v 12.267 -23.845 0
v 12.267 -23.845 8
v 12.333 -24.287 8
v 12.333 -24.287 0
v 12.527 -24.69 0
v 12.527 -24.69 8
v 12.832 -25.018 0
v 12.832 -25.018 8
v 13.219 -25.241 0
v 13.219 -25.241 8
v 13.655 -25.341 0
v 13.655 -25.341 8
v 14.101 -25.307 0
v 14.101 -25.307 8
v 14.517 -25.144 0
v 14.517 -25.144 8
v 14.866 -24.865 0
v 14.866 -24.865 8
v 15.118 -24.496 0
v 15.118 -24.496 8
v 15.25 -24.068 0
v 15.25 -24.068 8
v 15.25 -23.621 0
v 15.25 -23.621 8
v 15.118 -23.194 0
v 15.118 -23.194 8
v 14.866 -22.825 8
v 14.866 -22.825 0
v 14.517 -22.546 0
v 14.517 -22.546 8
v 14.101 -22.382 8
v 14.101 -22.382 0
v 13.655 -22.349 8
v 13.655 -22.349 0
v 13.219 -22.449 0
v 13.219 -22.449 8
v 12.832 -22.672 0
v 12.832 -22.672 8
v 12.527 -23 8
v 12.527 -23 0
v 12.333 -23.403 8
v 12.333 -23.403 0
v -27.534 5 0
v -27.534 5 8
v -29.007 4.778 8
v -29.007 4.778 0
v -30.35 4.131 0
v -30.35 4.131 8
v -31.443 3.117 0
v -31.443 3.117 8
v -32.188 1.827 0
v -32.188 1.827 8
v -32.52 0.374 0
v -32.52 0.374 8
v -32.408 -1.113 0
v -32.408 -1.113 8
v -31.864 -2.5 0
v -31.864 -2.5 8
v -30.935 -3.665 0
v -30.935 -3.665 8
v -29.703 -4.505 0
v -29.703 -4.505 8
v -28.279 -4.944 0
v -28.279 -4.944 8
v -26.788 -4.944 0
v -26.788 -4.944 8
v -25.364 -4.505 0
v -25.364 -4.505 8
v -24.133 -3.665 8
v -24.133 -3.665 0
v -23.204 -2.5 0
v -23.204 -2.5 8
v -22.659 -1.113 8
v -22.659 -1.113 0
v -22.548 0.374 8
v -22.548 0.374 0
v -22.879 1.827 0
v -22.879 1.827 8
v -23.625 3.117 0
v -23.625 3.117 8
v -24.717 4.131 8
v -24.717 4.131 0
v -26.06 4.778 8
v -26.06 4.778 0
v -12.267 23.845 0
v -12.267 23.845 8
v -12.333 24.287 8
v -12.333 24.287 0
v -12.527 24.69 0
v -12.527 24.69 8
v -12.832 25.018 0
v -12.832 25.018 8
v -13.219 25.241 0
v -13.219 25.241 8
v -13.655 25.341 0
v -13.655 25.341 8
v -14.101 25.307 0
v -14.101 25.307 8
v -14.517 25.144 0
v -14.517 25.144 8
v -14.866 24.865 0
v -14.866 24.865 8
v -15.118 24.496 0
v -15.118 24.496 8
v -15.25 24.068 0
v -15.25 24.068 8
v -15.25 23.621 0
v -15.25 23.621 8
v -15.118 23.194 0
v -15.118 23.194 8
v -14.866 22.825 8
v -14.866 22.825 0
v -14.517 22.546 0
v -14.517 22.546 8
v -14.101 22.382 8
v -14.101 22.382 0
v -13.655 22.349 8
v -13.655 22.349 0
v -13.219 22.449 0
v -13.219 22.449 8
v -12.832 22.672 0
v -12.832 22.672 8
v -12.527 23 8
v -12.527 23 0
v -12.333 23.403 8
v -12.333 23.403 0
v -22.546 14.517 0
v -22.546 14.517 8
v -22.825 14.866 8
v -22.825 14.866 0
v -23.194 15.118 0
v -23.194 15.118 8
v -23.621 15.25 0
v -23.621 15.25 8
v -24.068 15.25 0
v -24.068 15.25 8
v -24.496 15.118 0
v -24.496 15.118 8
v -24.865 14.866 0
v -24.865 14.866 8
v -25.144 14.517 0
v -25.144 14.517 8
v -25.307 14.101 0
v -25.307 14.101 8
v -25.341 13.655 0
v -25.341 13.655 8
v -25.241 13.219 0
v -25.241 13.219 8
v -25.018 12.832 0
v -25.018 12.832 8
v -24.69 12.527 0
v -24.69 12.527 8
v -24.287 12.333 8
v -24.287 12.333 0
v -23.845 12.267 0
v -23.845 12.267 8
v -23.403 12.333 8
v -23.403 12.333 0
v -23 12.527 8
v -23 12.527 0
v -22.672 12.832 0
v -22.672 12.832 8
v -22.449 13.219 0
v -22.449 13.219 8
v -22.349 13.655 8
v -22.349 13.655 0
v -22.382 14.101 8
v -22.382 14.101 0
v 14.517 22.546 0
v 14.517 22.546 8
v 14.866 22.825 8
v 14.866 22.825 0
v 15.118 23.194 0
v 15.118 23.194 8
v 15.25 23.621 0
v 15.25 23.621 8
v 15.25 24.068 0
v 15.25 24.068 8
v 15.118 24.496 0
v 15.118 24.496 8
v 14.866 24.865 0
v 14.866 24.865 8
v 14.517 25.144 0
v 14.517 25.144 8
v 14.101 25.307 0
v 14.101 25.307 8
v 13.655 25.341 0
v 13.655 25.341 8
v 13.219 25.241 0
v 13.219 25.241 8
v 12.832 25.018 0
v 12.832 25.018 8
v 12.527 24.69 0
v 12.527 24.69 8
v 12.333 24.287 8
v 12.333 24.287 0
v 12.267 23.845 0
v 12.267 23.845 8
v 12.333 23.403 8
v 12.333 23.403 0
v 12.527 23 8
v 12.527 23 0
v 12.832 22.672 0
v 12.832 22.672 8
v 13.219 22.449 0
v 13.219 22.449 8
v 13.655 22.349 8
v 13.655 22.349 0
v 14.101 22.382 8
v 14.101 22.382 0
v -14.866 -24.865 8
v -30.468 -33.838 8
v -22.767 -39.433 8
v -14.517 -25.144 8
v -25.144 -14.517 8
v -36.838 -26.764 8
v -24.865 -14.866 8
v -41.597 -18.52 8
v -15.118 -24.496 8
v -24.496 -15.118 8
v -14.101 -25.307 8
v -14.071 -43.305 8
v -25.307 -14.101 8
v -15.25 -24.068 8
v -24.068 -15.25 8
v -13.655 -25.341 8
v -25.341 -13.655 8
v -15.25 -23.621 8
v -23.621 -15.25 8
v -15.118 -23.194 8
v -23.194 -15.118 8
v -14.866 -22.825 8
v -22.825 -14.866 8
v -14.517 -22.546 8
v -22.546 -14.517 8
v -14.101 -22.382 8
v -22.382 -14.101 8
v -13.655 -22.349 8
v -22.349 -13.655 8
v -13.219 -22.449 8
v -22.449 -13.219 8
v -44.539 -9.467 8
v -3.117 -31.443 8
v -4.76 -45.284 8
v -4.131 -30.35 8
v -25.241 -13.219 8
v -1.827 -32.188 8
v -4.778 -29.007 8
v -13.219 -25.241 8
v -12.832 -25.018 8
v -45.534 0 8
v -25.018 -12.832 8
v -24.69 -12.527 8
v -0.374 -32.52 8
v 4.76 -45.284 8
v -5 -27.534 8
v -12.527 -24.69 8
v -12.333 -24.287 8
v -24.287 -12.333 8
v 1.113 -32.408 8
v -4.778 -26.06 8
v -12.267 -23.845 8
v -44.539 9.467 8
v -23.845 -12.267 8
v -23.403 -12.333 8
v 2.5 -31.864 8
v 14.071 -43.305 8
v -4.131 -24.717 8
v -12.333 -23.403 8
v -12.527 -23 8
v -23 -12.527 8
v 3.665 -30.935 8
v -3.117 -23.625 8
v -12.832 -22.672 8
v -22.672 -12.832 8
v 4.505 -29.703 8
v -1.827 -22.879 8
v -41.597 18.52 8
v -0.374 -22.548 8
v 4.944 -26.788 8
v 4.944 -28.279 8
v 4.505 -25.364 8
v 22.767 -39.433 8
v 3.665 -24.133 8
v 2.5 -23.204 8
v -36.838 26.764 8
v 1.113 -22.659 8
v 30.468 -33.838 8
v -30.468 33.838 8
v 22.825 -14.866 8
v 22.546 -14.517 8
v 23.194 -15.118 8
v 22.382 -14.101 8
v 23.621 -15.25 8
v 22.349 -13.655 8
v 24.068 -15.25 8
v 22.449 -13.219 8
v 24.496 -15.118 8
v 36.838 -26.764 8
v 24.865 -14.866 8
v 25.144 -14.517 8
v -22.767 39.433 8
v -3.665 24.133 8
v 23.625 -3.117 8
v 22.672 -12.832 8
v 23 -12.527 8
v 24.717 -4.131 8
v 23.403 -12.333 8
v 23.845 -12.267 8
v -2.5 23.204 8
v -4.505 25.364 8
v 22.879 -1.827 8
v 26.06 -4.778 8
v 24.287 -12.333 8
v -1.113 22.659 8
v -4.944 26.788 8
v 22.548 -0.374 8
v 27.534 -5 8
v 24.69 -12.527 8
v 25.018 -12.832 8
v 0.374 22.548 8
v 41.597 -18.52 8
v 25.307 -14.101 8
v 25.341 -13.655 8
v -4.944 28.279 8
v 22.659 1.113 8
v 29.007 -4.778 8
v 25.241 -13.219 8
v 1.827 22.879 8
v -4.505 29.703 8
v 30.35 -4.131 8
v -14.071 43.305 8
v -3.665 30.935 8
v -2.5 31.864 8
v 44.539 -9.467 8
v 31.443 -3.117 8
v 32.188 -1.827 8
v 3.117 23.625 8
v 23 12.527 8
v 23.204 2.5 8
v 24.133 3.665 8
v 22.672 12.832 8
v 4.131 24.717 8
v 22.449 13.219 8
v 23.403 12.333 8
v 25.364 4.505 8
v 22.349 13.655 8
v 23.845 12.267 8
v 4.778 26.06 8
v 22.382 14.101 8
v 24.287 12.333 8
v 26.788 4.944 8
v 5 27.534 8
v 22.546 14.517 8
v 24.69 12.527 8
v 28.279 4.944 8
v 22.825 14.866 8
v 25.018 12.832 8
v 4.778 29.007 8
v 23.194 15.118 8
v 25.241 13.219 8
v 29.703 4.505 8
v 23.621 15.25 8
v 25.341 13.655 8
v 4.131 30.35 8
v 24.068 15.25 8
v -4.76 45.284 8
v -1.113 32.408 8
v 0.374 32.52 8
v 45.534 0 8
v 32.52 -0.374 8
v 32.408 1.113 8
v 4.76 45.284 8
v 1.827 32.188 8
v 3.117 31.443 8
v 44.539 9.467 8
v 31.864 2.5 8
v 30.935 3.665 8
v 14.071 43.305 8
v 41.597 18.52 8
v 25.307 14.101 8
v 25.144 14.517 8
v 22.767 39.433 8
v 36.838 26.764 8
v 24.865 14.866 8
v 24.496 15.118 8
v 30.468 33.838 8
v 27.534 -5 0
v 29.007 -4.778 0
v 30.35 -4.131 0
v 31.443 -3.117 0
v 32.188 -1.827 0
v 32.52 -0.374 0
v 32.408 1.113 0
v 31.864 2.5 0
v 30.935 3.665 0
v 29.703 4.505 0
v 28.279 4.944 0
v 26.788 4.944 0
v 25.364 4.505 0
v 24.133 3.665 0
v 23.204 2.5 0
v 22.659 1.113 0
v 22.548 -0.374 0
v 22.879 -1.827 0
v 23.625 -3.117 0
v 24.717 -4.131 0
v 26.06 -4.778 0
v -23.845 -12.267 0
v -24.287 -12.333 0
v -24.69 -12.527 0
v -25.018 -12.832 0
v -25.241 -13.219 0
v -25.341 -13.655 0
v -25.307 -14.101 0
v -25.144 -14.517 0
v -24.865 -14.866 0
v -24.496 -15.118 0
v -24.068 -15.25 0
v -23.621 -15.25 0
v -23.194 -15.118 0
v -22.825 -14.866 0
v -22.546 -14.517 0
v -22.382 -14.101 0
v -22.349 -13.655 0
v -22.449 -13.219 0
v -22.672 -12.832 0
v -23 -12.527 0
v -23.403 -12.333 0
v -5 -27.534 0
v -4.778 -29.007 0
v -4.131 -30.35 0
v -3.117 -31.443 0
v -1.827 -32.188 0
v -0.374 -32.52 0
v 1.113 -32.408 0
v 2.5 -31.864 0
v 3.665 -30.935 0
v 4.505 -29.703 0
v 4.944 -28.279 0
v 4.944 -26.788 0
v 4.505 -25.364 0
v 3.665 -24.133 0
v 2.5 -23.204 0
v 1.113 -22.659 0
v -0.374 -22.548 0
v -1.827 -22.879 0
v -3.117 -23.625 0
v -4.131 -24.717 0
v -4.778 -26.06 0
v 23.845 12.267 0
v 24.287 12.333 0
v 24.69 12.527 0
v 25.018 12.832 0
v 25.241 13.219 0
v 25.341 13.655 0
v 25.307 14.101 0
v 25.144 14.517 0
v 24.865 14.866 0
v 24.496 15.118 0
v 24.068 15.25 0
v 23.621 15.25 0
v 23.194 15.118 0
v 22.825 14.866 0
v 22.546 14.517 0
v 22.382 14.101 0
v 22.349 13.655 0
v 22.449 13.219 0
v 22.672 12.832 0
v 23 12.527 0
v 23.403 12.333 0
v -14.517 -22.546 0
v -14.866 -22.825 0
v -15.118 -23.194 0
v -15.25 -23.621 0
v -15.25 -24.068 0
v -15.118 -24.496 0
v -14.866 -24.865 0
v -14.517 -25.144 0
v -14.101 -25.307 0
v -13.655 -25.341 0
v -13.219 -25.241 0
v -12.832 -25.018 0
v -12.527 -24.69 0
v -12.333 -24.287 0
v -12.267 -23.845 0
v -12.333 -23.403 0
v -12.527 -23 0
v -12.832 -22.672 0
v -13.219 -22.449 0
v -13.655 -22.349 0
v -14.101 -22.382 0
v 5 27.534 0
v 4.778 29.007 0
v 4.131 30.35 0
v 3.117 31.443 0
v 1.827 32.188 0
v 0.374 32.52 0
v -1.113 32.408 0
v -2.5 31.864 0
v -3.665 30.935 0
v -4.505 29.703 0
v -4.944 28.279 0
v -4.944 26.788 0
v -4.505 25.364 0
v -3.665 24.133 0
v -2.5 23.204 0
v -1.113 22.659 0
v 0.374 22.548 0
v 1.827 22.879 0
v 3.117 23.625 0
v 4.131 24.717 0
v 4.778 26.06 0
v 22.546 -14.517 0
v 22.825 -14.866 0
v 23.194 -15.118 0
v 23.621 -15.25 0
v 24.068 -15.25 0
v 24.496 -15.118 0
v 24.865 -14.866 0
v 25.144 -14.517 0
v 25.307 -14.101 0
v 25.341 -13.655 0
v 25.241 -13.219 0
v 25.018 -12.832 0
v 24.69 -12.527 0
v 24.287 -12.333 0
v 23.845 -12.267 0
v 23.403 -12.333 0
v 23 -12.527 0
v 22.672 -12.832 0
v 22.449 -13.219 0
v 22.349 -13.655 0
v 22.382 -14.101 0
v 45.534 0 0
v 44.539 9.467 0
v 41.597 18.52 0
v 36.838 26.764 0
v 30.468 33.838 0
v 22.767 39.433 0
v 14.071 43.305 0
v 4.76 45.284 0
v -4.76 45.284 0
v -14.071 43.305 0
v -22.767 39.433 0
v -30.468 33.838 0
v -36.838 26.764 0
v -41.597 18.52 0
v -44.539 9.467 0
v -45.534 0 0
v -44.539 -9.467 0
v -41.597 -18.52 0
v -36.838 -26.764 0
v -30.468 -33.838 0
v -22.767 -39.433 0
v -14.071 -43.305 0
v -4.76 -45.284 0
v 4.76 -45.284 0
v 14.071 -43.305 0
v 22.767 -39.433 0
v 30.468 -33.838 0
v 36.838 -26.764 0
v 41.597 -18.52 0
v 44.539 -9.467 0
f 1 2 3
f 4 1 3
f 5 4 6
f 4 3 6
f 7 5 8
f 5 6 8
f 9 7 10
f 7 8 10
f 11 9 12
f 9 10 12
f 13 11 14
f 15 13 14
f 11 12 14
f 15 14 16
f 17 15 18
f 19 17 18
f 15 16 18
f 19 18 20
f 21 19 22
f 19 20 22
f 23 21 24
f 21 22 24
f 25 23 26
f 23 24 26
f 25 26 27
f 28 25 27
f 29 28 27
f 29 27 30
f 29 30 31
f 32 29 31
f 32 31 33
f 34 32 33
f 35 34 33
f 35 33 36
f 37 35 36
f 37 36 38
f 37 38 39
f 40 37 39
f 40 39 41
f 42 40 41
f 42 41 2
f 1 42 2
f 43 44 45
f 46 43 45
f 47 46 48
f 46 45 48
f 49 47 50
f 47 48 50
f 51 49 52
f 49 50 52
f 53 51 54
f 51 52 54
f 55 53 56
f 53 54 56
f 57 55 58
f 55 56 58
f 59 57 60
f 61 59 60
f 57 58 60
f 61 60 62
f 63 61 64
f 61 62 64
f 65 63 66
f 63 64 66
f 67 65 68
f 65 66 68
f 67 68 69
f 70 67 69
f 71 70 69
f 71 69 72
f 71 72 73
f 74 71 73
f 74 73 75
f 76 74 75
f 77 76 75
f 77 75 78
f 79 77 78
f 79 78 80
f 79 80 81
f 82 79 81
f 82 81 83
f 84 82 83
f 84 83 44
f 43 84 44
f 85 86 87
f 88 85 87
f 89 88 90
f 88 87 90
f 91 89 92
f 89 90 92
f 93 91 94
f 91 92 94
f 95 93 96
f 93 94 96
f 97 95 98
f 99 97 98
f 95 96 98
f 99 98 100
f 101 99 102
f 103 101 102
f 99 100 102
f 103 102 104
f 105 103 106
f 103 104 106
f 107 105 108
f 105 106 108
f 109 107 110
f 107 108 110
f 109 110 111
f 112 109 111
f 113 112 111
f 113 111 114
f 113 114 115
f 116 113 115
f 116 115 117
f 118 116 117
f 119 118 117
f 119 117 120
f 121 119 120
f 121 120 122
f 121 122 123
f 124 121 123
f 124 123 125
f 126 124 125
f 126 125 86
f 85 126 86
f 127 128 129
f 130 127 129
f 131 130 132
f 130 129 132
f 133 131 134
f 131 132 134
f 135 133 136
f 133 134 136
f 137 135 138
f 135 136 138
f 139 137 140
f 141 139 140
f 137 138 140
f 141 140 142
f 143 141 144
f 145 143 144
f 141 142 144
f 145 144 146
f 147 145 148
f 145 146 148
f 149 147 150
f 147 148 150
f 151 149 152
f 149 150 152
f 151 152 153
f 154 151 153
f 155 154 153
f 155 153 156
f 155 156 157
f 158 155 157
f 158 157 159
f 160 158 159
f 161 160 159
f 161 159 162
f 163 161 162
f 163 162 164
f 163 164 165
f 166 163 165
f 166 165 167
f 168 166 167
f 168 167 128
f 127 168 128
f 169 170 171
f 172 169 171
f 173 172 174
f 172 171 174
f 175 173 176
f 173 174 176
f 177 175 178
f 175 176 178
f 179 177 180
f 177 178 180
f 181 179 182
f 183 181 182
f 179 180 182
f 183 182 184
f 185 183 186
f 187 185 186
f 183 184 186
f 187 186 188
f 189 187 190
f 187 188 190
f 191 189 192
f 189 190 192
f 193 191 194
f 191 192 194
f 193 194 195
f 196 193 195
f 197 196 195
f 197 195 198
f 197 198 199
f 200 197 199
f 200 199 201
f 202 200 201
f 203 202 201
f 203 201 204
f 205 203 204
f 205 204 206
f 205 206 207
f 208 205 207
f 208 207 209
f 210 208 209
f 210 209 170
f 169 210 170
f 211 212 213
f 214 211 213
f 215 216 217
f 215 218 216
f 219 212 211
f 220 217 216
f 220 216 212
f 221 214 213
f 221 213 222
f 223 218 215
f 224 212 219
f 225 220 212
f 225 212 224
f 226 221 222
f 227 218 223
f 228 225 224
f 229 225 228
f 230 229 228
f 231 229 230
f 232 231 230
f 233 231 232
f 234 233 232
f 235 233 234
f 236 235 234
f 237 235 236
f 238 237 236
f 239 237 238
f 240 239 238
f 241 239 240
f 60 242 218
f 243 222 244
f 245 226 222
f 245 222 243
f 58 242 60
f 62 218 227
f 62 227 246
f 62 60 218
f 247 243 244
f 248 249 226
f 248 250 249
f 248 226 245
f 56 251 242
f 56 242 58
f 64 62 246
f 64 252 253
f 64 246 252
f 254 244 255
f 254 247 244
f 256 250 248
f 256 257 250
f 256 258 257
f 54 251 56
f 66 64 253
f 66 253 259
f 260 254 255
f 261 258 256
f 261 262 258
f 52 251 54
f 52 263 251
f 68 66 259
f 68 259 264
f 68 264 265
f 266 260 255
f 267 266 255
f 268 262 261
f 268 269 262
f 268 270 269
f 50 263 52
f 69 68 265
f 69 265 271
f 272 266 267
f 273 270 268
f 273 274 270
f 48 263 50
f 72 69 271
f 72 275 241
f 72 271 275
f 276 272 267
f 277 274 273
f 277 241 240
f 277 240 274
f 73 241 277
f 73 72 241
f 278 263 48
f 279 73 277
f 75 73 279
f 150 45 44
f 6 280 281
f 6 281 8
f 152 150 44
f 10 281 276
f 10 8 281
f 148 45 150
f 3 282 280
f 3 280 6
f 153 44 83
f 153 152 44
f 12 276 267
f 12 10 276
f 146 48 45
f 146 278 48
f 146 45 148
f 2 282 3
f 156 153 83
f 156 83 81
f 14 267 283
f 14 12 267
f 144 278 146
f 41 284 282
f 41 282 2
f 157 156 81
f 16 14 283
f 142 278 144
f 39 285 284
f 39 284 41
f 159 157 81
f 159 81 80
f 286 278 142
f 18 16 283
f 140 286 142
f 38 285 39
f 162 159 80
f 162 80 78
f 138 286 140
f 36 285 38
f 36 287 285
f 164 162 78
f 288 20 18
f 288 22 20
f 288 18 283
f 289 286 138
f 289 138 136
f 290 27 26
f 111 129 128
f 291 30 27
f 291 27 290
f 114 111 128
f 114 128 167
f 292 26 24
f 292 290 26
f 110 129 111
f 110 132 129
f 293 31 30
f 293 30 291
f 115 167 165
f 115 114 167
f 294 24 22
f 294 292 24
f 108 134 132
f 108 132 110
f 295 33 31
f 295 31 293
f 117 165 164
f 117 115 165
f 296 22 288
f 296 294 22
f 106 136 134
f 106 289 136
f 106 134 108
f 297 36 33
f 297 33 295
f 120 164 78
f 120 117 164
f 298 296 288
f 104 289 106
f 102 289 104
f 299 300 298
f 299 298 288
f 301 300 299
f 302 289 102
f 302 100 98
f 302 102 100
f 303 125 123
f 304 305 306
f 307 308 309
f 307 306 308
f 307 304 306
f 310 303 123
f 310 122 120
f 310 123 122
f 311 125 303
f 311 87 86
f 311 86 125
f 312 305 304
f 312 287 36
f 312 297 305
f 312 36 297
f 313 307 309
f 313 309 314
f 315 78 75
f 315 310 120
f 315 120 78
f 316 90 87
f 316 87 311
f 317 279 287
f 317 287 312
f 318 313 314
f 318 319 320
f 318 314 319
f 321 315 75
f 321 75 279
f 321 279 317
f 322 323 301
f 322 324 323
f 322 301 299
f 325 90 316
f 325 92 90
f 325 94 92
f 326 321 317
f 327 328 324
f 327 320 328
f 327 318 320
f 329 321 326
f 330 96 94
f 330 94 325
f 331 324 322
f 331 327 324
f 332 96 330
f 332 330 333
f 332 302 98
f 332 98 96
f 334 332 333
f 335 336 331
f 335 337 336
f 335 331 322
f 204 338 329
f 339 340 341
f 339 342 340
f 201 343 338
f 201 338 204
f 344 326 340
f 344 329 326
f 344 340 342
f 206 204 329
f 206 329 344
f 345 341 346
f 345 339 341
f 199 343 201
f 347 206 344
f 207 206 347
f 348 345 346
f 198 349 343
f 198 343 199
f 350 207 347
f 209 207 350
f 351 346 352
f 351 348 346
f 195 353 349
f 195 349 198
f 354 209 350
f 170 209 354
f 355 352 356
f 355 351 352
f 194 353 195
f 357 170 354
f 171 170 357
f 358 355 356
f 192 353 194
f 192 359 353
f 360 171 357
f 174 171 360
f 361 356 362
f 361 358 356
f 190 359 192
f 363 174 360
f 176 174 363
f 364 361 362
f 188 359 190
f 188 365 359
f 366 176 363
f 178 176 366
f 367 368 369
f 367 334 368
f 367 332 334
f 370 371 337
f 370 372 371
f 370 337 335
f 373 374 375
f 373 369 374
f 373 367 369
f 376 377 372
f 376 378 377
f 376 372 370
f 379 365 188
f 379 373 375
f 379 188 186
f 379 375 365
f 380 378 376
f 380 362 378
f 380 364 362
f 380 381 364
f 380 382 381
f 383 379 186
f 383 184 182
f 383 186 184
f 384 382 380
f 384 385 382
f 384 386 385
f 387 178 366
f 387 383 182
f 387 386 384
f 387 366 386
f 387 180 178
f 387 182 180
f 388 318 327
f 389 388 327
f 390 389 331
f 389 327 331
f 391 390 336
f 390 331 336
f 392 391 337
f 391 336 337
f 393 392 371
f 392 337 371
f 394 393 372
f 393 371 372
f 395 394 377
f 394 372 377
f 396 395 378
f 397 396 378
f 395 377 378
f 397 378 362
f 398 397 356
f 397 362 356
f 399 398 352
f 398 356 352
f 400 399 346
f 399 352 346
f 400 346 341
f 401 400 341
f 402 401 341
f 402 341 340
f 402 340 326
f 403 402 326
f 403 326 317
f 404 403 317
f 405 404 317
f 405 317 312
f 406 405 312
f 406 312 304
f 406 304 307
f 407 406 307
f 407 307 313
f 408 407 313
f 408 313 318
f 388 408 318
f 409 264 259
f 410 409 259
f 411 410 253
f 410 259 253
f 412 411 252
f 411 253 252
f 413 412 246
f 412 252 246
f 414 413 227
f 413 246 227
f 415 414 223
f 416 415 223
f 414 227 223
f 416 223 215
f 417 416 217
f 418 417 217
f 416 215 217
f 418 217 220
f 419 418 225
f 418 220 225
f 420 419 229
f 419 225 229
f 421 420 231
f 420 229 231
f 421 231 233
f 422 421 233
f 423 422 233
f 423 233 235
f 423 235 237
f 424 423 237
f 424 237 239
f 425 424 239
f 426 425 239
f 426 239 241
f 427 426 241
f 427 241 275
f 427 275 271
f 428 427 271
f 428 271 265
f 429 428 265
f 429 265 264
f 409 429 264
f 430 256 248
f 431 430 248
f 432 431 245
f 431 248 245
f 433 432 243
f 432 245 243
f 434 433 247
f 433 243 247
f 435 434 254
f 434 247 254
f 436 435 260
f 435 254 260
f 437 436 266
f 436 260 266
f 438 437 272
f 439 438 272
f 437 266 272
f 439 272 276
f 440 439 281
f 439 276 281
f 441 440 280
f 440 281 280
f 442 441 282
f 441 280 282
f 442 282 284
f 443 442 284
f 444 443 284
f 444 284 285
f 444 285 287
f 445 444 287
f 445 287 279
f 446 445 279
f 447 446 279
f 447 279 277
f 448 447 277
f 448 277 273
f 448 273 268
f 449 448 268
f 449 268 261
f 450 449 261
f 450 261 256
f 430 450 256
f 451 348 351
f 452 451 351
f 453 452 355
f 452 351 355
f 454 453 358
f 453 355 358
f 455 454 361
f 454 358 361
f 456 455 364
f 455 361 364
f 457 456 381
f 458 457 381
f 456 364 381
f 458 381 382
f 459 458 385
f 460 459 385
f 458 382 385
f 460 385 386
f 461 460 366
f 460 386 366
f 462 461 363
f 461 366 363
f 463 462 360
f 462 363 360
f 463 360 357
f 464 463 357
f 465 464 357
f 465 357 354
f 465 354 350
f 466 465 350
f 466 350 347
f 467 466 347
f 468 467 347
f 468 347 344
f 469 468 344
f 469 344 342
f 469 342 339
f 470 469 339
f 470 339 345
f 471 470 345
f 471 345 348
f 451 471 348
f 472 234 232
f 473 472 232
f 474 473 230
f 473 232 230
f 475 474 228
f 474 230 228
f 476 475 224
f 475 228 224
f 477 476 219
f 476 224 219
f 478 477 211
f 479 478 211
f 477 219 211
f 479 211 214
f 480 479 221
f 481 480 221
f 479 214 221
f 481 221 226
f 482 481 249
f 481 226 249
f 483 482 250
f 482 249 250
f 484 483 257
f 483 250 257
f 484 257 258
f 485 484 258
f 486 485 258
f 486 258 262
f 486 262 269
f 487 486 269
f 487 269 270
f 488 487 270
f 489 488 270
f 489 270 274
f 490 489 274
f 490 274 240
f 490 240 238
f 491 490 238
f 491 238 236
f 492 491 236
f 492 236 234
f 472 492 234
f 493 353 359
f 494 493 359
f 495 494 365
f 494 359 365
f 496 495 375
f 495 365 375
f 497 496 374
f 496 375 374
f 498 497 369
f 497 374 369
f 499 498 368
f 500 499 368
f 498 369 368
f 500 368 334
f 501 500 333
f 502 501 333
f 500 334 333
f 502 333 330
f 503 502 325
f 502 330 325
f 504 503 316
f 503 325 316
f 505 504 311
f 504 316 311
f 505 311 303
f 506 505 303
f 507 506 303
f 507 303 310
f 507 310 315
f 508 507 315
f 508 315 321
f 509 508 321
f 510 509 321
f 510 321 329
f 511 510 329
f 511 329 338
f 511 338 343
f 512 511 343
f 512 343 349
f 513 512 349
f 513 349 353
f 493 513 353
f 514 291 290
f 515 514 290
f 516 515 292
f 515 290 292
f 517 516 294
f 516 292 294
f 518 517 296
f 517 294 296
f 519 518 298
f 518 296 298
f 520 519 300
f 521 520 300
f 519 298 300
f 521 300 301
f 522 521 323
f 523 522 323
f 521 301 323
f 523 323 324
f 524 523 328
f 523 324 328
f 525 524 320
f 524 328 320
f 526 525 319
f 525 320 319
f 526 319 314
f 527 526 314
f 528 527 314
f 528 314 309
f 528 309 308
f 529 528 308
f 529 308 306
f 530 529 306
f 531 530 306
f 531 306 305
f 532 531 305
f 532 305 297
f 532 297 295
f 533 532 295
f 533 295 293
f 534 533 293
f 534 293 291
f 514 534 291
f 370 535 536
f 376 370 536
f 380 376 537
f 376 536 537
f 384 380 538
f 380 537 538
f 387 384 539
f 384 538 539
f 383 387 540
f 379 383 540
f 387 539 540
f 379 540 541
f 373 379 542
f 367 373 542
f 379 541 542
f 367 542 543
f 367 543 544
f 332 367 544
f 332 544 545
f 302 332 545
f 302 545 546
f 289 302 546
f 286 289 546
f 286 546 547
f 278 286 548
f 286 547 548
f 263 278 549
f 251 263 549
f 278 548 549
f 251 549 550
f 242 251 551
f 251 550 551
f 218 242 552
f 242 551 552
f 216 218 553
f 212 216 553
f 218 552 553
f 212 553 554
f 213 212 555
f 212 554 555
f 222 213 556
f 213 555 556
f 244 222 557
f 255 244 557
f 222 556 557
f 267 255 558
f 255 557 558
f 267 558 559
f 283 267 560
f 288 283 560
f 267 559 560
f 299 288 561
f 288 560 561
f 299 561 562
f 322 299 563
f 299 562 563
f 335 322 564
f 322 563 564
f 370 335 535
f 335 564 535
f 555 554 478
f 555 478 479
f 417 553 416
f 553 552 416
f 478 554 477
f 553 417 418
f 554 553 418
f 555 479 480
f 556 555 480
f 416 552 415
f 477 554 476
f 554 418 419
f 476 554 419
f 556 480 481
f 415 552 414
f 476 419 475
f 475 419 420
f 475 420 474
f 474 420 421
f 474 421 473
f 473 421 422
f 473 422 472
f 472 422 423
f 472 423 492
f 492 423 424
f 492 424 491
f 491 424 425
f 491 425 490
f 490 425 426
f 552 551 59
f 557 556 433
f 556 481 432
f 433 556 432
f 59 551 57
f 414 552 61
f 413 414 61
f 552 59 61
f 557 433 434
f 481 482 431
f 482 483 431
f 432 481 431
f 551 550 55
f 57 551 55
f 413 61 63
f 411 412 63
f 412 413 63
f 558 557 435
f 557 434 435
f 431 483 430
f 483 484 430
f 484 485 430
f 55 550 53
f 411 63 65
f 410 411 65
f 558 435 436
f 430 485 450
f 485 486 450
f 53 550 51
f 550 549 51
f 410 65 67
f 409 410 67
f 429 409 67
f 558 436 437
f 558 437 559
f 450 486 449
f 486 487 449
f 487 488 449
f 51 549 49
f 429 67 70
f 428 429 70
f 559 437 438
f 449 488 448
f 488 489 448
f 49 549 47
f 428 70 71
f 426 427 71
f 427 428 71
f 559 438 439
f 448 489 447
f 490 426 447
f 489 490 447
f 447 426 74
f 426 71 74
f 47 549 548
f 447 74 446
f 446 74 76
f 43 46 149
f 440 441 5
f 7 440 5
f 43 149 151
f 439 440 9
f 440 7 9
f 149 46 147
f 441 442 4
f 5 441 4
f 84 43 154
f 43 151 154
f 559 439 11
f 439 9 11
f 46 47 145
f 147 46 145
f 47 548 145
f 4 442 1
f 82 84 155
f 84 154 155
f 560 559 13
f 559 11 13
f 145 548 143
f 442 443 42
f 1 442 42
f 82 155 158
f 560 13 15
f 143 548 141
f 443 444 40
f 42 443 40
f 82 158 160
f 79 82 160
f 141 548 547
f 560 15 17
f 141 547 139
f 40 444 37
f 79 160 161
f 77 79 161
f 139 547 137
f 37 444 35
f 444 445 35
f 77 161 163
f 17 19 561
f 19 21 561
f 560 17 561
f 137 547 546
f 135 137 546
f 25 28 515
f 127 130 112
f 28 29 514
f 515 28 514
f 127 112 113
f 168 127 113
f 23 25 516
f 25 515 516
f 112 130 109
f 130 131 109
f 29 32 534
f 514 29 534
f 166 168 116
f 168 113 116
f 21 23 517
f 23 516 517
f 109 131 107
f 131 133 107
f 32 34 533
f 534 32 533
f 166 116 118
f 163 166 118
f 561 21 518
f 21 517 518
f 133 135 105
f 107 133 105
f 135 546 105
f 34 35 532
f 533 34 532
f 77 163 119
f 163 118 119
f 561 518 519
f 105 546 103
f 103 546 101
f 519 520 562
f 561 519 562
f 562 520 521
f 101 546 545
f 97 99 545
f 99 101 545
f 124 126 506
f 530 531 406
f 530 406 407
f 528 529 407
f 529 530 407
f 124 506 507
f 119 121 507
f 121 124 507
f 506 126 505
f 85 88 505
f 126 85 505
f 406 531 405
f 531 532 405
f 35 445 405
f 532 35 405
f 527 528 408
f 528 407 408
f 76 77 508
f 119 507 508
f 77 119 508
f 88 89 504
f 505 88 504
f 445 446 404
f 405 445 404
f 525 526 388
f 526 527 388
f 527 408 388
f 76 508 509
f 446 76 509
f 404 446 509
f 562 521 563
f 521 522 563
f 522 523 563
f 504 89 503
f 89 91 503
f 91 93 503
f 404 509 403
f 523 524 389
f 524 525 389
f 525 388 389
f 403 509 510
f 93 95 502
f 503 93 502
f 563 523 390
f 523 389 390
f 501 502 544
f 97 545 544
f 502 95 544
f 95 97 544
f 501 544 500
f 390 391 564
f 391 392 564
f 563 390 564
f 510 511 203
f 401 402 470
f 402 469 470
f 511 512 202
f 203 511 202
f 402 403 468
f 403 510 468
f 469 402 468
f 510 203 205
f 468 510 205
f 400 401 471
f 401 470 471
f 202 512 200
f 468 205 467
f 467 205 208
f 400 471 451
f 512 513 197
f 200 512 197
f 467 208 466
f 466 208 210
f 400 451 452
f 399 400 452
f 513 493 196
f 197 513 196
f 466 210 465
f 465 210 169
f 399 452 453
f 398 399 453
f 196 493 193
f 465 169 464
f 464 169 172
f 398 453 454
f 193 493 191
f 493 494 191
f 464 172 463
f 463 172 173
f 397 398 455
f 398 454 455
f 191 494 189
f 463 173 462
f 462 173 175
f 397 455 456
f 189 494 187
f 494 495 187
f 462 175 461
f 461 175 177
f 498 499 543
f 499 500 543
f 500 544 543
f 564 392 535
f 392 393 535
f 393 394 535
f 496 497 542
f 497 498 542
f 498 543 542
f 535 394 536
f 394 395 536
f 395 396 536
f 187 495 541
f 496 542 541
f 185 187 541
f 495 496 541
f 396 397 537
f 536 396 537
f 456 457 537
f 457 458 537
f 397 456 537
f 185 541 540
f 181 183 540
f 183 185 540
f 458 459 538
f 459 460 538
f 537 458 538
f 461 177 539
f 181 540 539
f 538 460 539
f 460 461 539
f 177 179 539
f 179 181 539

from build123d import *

# Parameters (mm, degrees)
SKETCH_R              = 45.533695
PAD_DEPTH             = 8
SKETCH001_R           = 5
POCKET_DEPTH          = 266.074935
POLARPATTERN_COUNT    = 4
SKETCH002_R           = 1.5
POCKET001_DEPTH       = 266.074935
POLARPATTERN001_COUNT = 12


with BuildPart() as part:
    # Sketch → Pad (new body)
    with BuildSketch(Plane.XY):
        Circle(SKETCH_R)
    extrude(amount=PAD_DEPTH)

    # Sketch001 (on Face3 of Pad) → Pocket (cut, through all)
    with BuildSketch(Plane.XY.offset(8)):
        with Locations((0, 27.533695)):
            Circle(SKETCH001_R)
    pocket = extrude(amount=-POCKET_DEPTH, mode=Mode.SUBTRACT)

    # PolarPattern: Pocket ×4 about axis
    polarpattern_axis = Axis((0, 0, 8), (0, 0, 1))
    for i in range(1, POLARPATTERN_COUNT):
        add(pocket.rotate(polarpattern_axis, i * 360 / POLARPATTERN_COUNT), mode=Mode.SUBTRACT)

    # Sketch002 (on Face3 of Pad) → Pocket001 (cut, through all)
    with BuildSketch(Plane.XY.offset(8)):
        with Locations((-13.766847, 23.844879)):
            Circle(SKETCH002_R)
    pocket001 = extrude(amount=-POCKET001_DEPTH, mode=Mode.SUBTRACT)

    # PolarPattern001: Pocket001 ×12 about axis
    polarpattern001_axis = Axis((0, 0, 8), (0, 0, 1))
    for i in range(1, POLARPATTERN001_COUNT):
        add(pocket001.rotate(polarpattern001_axis, i * 360 / POLARPATTERN001_COUNT), mode=Mode.SUBTRACT)


solid = part.part
